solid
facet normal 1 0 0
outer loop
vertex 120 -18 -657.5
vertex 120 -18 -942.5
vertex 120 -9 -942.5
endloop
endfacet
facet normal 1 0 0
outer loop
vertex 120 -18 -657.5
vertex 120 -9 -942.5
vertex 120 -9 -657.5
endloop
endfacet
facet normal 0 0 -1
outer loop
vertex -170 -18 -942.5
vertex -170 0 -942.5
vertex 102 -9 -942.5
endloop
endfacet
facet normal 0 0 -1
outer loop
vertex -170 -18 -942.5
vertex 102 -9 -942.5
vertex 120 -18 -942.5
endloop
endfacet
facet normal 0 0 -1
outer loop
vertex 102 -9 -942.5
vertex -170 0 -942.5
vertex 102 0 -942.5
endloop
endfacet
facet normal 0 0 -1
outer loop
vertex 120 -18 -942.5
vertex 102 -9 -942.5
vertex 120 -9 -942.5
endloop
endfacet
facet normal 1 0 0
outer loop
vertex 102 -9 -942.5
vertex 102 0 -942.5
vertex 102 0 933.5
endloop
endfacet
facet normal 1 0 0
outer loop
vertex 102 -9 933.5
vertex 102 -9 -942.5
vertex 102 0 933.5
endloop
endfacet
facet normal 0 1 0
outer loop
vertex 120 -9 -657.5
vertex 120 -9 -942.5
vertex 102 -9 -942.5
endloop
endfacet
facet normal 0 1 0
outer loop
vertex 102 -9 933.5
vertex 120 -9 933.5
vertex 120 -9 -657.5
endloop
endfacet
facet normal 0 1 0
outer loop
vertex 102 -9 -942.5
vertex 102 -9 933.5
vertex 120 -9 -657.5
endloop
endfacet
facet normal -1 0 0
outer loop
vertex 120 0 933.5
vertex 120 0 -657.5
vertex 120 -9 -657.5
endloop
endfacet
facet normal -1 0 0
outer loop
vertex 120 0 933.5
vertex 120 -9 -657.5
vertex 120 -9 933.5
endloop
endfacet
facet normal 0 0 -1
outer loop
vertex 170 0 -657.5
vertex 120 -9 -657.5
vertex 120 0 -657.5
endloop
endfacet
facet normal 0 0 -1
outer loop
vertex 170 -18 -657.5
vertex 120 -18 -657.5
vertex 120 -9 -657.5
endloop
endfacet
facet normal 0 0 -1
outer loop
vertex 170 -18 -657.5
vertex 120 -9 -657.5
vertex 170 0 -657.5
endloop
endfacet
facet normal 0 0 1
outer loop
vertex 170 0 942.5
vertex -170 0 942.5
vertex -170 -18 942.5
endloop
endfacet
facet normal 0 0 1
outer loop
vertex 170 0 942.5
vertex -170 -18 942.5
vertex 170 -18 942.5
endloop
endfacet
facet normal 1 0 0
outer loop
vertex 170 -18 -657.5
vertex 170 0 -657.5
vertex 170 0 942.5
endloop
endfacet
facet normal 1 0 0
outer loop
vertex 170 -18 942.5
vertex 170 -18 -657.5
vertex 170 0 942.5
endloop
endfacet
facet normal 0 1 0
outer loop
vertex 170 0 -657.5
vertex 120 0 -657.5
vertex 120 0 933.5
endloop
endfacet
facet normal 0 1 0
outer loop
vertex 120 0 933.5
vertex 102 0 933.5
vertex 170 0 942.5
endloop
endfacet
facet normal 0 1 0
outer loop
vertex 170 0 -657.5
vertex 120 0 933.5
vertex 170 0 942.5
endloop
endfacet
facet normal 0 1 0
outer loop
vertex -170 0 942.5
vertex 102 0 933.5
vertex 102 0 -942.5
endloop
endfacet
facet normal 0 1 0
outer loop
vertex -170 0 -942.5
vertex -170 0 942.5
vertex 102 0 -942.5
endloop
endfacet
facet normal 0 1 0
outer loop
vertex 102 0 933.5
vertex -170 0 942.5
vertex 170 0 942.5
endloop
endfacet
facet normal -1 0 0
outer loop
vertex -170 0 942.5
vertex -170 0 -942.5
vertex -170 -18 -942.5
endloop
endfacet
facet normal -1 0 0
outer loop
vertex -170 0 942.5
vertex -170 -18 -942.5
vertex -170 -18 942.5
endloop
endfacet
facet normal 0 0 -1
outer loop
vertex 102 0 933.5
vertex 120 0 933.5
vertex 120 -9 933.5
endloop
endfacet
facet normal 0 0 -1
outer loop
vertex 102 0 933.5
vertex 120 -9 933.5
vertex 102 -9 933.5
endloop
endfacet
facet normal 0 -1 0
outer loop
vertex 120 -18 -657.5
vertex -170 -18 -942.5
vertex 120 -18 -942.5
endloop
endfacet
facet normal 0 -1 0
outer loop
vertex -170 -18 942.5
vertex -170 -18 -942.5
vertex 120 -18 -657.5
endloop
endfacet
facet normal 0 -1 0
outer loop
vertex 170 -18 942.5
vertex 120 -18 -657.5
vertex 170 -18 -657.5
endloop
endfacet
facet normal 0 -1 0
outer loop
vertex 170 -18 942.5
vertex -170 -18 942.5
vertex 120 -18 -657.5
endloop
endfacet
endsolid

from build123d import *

# Parameters (mm, degrees)
F0_W     = 340
F0_H     = 1885
F1_DEPTH = 18
F2_W     = 50
F2_H     = 285
F3_DEPTH = 18
F4_W     = 18
F4_H     = 1876
F5_DEPTH = 9


with BuildPart() as f1:
    # F0 (on Front) → F1 (new body)
    with BuildSketch(Plane.XZ):
        Rectangle(F0_W, F0_H)
    extrude(amount=F1_DEPTH)

    # F2 (on face) → F3 (cut)
    with BuildSketch(Plane.XZ.offset(18)):
        with Locations((145, -800)):
            Rectangle(F2_W, F2_H)
    extrude(amount=-F3_DEPTH, mode=Mode.SUBTRACT)

    # F4 (on face) → F5 (cut)
    with BuildSketch(Plane(origin=(0, 0, 0), x_dir=(-1, 0, 0), z_dir=(0, 1, 0))):
        with Locations((-111, -4.5)):
            Rectangle(F4_W, F4_H)
    extrude(amount=-F5_DEPTH, mode=Mode.SUBTRACT)


solid = f1.part
